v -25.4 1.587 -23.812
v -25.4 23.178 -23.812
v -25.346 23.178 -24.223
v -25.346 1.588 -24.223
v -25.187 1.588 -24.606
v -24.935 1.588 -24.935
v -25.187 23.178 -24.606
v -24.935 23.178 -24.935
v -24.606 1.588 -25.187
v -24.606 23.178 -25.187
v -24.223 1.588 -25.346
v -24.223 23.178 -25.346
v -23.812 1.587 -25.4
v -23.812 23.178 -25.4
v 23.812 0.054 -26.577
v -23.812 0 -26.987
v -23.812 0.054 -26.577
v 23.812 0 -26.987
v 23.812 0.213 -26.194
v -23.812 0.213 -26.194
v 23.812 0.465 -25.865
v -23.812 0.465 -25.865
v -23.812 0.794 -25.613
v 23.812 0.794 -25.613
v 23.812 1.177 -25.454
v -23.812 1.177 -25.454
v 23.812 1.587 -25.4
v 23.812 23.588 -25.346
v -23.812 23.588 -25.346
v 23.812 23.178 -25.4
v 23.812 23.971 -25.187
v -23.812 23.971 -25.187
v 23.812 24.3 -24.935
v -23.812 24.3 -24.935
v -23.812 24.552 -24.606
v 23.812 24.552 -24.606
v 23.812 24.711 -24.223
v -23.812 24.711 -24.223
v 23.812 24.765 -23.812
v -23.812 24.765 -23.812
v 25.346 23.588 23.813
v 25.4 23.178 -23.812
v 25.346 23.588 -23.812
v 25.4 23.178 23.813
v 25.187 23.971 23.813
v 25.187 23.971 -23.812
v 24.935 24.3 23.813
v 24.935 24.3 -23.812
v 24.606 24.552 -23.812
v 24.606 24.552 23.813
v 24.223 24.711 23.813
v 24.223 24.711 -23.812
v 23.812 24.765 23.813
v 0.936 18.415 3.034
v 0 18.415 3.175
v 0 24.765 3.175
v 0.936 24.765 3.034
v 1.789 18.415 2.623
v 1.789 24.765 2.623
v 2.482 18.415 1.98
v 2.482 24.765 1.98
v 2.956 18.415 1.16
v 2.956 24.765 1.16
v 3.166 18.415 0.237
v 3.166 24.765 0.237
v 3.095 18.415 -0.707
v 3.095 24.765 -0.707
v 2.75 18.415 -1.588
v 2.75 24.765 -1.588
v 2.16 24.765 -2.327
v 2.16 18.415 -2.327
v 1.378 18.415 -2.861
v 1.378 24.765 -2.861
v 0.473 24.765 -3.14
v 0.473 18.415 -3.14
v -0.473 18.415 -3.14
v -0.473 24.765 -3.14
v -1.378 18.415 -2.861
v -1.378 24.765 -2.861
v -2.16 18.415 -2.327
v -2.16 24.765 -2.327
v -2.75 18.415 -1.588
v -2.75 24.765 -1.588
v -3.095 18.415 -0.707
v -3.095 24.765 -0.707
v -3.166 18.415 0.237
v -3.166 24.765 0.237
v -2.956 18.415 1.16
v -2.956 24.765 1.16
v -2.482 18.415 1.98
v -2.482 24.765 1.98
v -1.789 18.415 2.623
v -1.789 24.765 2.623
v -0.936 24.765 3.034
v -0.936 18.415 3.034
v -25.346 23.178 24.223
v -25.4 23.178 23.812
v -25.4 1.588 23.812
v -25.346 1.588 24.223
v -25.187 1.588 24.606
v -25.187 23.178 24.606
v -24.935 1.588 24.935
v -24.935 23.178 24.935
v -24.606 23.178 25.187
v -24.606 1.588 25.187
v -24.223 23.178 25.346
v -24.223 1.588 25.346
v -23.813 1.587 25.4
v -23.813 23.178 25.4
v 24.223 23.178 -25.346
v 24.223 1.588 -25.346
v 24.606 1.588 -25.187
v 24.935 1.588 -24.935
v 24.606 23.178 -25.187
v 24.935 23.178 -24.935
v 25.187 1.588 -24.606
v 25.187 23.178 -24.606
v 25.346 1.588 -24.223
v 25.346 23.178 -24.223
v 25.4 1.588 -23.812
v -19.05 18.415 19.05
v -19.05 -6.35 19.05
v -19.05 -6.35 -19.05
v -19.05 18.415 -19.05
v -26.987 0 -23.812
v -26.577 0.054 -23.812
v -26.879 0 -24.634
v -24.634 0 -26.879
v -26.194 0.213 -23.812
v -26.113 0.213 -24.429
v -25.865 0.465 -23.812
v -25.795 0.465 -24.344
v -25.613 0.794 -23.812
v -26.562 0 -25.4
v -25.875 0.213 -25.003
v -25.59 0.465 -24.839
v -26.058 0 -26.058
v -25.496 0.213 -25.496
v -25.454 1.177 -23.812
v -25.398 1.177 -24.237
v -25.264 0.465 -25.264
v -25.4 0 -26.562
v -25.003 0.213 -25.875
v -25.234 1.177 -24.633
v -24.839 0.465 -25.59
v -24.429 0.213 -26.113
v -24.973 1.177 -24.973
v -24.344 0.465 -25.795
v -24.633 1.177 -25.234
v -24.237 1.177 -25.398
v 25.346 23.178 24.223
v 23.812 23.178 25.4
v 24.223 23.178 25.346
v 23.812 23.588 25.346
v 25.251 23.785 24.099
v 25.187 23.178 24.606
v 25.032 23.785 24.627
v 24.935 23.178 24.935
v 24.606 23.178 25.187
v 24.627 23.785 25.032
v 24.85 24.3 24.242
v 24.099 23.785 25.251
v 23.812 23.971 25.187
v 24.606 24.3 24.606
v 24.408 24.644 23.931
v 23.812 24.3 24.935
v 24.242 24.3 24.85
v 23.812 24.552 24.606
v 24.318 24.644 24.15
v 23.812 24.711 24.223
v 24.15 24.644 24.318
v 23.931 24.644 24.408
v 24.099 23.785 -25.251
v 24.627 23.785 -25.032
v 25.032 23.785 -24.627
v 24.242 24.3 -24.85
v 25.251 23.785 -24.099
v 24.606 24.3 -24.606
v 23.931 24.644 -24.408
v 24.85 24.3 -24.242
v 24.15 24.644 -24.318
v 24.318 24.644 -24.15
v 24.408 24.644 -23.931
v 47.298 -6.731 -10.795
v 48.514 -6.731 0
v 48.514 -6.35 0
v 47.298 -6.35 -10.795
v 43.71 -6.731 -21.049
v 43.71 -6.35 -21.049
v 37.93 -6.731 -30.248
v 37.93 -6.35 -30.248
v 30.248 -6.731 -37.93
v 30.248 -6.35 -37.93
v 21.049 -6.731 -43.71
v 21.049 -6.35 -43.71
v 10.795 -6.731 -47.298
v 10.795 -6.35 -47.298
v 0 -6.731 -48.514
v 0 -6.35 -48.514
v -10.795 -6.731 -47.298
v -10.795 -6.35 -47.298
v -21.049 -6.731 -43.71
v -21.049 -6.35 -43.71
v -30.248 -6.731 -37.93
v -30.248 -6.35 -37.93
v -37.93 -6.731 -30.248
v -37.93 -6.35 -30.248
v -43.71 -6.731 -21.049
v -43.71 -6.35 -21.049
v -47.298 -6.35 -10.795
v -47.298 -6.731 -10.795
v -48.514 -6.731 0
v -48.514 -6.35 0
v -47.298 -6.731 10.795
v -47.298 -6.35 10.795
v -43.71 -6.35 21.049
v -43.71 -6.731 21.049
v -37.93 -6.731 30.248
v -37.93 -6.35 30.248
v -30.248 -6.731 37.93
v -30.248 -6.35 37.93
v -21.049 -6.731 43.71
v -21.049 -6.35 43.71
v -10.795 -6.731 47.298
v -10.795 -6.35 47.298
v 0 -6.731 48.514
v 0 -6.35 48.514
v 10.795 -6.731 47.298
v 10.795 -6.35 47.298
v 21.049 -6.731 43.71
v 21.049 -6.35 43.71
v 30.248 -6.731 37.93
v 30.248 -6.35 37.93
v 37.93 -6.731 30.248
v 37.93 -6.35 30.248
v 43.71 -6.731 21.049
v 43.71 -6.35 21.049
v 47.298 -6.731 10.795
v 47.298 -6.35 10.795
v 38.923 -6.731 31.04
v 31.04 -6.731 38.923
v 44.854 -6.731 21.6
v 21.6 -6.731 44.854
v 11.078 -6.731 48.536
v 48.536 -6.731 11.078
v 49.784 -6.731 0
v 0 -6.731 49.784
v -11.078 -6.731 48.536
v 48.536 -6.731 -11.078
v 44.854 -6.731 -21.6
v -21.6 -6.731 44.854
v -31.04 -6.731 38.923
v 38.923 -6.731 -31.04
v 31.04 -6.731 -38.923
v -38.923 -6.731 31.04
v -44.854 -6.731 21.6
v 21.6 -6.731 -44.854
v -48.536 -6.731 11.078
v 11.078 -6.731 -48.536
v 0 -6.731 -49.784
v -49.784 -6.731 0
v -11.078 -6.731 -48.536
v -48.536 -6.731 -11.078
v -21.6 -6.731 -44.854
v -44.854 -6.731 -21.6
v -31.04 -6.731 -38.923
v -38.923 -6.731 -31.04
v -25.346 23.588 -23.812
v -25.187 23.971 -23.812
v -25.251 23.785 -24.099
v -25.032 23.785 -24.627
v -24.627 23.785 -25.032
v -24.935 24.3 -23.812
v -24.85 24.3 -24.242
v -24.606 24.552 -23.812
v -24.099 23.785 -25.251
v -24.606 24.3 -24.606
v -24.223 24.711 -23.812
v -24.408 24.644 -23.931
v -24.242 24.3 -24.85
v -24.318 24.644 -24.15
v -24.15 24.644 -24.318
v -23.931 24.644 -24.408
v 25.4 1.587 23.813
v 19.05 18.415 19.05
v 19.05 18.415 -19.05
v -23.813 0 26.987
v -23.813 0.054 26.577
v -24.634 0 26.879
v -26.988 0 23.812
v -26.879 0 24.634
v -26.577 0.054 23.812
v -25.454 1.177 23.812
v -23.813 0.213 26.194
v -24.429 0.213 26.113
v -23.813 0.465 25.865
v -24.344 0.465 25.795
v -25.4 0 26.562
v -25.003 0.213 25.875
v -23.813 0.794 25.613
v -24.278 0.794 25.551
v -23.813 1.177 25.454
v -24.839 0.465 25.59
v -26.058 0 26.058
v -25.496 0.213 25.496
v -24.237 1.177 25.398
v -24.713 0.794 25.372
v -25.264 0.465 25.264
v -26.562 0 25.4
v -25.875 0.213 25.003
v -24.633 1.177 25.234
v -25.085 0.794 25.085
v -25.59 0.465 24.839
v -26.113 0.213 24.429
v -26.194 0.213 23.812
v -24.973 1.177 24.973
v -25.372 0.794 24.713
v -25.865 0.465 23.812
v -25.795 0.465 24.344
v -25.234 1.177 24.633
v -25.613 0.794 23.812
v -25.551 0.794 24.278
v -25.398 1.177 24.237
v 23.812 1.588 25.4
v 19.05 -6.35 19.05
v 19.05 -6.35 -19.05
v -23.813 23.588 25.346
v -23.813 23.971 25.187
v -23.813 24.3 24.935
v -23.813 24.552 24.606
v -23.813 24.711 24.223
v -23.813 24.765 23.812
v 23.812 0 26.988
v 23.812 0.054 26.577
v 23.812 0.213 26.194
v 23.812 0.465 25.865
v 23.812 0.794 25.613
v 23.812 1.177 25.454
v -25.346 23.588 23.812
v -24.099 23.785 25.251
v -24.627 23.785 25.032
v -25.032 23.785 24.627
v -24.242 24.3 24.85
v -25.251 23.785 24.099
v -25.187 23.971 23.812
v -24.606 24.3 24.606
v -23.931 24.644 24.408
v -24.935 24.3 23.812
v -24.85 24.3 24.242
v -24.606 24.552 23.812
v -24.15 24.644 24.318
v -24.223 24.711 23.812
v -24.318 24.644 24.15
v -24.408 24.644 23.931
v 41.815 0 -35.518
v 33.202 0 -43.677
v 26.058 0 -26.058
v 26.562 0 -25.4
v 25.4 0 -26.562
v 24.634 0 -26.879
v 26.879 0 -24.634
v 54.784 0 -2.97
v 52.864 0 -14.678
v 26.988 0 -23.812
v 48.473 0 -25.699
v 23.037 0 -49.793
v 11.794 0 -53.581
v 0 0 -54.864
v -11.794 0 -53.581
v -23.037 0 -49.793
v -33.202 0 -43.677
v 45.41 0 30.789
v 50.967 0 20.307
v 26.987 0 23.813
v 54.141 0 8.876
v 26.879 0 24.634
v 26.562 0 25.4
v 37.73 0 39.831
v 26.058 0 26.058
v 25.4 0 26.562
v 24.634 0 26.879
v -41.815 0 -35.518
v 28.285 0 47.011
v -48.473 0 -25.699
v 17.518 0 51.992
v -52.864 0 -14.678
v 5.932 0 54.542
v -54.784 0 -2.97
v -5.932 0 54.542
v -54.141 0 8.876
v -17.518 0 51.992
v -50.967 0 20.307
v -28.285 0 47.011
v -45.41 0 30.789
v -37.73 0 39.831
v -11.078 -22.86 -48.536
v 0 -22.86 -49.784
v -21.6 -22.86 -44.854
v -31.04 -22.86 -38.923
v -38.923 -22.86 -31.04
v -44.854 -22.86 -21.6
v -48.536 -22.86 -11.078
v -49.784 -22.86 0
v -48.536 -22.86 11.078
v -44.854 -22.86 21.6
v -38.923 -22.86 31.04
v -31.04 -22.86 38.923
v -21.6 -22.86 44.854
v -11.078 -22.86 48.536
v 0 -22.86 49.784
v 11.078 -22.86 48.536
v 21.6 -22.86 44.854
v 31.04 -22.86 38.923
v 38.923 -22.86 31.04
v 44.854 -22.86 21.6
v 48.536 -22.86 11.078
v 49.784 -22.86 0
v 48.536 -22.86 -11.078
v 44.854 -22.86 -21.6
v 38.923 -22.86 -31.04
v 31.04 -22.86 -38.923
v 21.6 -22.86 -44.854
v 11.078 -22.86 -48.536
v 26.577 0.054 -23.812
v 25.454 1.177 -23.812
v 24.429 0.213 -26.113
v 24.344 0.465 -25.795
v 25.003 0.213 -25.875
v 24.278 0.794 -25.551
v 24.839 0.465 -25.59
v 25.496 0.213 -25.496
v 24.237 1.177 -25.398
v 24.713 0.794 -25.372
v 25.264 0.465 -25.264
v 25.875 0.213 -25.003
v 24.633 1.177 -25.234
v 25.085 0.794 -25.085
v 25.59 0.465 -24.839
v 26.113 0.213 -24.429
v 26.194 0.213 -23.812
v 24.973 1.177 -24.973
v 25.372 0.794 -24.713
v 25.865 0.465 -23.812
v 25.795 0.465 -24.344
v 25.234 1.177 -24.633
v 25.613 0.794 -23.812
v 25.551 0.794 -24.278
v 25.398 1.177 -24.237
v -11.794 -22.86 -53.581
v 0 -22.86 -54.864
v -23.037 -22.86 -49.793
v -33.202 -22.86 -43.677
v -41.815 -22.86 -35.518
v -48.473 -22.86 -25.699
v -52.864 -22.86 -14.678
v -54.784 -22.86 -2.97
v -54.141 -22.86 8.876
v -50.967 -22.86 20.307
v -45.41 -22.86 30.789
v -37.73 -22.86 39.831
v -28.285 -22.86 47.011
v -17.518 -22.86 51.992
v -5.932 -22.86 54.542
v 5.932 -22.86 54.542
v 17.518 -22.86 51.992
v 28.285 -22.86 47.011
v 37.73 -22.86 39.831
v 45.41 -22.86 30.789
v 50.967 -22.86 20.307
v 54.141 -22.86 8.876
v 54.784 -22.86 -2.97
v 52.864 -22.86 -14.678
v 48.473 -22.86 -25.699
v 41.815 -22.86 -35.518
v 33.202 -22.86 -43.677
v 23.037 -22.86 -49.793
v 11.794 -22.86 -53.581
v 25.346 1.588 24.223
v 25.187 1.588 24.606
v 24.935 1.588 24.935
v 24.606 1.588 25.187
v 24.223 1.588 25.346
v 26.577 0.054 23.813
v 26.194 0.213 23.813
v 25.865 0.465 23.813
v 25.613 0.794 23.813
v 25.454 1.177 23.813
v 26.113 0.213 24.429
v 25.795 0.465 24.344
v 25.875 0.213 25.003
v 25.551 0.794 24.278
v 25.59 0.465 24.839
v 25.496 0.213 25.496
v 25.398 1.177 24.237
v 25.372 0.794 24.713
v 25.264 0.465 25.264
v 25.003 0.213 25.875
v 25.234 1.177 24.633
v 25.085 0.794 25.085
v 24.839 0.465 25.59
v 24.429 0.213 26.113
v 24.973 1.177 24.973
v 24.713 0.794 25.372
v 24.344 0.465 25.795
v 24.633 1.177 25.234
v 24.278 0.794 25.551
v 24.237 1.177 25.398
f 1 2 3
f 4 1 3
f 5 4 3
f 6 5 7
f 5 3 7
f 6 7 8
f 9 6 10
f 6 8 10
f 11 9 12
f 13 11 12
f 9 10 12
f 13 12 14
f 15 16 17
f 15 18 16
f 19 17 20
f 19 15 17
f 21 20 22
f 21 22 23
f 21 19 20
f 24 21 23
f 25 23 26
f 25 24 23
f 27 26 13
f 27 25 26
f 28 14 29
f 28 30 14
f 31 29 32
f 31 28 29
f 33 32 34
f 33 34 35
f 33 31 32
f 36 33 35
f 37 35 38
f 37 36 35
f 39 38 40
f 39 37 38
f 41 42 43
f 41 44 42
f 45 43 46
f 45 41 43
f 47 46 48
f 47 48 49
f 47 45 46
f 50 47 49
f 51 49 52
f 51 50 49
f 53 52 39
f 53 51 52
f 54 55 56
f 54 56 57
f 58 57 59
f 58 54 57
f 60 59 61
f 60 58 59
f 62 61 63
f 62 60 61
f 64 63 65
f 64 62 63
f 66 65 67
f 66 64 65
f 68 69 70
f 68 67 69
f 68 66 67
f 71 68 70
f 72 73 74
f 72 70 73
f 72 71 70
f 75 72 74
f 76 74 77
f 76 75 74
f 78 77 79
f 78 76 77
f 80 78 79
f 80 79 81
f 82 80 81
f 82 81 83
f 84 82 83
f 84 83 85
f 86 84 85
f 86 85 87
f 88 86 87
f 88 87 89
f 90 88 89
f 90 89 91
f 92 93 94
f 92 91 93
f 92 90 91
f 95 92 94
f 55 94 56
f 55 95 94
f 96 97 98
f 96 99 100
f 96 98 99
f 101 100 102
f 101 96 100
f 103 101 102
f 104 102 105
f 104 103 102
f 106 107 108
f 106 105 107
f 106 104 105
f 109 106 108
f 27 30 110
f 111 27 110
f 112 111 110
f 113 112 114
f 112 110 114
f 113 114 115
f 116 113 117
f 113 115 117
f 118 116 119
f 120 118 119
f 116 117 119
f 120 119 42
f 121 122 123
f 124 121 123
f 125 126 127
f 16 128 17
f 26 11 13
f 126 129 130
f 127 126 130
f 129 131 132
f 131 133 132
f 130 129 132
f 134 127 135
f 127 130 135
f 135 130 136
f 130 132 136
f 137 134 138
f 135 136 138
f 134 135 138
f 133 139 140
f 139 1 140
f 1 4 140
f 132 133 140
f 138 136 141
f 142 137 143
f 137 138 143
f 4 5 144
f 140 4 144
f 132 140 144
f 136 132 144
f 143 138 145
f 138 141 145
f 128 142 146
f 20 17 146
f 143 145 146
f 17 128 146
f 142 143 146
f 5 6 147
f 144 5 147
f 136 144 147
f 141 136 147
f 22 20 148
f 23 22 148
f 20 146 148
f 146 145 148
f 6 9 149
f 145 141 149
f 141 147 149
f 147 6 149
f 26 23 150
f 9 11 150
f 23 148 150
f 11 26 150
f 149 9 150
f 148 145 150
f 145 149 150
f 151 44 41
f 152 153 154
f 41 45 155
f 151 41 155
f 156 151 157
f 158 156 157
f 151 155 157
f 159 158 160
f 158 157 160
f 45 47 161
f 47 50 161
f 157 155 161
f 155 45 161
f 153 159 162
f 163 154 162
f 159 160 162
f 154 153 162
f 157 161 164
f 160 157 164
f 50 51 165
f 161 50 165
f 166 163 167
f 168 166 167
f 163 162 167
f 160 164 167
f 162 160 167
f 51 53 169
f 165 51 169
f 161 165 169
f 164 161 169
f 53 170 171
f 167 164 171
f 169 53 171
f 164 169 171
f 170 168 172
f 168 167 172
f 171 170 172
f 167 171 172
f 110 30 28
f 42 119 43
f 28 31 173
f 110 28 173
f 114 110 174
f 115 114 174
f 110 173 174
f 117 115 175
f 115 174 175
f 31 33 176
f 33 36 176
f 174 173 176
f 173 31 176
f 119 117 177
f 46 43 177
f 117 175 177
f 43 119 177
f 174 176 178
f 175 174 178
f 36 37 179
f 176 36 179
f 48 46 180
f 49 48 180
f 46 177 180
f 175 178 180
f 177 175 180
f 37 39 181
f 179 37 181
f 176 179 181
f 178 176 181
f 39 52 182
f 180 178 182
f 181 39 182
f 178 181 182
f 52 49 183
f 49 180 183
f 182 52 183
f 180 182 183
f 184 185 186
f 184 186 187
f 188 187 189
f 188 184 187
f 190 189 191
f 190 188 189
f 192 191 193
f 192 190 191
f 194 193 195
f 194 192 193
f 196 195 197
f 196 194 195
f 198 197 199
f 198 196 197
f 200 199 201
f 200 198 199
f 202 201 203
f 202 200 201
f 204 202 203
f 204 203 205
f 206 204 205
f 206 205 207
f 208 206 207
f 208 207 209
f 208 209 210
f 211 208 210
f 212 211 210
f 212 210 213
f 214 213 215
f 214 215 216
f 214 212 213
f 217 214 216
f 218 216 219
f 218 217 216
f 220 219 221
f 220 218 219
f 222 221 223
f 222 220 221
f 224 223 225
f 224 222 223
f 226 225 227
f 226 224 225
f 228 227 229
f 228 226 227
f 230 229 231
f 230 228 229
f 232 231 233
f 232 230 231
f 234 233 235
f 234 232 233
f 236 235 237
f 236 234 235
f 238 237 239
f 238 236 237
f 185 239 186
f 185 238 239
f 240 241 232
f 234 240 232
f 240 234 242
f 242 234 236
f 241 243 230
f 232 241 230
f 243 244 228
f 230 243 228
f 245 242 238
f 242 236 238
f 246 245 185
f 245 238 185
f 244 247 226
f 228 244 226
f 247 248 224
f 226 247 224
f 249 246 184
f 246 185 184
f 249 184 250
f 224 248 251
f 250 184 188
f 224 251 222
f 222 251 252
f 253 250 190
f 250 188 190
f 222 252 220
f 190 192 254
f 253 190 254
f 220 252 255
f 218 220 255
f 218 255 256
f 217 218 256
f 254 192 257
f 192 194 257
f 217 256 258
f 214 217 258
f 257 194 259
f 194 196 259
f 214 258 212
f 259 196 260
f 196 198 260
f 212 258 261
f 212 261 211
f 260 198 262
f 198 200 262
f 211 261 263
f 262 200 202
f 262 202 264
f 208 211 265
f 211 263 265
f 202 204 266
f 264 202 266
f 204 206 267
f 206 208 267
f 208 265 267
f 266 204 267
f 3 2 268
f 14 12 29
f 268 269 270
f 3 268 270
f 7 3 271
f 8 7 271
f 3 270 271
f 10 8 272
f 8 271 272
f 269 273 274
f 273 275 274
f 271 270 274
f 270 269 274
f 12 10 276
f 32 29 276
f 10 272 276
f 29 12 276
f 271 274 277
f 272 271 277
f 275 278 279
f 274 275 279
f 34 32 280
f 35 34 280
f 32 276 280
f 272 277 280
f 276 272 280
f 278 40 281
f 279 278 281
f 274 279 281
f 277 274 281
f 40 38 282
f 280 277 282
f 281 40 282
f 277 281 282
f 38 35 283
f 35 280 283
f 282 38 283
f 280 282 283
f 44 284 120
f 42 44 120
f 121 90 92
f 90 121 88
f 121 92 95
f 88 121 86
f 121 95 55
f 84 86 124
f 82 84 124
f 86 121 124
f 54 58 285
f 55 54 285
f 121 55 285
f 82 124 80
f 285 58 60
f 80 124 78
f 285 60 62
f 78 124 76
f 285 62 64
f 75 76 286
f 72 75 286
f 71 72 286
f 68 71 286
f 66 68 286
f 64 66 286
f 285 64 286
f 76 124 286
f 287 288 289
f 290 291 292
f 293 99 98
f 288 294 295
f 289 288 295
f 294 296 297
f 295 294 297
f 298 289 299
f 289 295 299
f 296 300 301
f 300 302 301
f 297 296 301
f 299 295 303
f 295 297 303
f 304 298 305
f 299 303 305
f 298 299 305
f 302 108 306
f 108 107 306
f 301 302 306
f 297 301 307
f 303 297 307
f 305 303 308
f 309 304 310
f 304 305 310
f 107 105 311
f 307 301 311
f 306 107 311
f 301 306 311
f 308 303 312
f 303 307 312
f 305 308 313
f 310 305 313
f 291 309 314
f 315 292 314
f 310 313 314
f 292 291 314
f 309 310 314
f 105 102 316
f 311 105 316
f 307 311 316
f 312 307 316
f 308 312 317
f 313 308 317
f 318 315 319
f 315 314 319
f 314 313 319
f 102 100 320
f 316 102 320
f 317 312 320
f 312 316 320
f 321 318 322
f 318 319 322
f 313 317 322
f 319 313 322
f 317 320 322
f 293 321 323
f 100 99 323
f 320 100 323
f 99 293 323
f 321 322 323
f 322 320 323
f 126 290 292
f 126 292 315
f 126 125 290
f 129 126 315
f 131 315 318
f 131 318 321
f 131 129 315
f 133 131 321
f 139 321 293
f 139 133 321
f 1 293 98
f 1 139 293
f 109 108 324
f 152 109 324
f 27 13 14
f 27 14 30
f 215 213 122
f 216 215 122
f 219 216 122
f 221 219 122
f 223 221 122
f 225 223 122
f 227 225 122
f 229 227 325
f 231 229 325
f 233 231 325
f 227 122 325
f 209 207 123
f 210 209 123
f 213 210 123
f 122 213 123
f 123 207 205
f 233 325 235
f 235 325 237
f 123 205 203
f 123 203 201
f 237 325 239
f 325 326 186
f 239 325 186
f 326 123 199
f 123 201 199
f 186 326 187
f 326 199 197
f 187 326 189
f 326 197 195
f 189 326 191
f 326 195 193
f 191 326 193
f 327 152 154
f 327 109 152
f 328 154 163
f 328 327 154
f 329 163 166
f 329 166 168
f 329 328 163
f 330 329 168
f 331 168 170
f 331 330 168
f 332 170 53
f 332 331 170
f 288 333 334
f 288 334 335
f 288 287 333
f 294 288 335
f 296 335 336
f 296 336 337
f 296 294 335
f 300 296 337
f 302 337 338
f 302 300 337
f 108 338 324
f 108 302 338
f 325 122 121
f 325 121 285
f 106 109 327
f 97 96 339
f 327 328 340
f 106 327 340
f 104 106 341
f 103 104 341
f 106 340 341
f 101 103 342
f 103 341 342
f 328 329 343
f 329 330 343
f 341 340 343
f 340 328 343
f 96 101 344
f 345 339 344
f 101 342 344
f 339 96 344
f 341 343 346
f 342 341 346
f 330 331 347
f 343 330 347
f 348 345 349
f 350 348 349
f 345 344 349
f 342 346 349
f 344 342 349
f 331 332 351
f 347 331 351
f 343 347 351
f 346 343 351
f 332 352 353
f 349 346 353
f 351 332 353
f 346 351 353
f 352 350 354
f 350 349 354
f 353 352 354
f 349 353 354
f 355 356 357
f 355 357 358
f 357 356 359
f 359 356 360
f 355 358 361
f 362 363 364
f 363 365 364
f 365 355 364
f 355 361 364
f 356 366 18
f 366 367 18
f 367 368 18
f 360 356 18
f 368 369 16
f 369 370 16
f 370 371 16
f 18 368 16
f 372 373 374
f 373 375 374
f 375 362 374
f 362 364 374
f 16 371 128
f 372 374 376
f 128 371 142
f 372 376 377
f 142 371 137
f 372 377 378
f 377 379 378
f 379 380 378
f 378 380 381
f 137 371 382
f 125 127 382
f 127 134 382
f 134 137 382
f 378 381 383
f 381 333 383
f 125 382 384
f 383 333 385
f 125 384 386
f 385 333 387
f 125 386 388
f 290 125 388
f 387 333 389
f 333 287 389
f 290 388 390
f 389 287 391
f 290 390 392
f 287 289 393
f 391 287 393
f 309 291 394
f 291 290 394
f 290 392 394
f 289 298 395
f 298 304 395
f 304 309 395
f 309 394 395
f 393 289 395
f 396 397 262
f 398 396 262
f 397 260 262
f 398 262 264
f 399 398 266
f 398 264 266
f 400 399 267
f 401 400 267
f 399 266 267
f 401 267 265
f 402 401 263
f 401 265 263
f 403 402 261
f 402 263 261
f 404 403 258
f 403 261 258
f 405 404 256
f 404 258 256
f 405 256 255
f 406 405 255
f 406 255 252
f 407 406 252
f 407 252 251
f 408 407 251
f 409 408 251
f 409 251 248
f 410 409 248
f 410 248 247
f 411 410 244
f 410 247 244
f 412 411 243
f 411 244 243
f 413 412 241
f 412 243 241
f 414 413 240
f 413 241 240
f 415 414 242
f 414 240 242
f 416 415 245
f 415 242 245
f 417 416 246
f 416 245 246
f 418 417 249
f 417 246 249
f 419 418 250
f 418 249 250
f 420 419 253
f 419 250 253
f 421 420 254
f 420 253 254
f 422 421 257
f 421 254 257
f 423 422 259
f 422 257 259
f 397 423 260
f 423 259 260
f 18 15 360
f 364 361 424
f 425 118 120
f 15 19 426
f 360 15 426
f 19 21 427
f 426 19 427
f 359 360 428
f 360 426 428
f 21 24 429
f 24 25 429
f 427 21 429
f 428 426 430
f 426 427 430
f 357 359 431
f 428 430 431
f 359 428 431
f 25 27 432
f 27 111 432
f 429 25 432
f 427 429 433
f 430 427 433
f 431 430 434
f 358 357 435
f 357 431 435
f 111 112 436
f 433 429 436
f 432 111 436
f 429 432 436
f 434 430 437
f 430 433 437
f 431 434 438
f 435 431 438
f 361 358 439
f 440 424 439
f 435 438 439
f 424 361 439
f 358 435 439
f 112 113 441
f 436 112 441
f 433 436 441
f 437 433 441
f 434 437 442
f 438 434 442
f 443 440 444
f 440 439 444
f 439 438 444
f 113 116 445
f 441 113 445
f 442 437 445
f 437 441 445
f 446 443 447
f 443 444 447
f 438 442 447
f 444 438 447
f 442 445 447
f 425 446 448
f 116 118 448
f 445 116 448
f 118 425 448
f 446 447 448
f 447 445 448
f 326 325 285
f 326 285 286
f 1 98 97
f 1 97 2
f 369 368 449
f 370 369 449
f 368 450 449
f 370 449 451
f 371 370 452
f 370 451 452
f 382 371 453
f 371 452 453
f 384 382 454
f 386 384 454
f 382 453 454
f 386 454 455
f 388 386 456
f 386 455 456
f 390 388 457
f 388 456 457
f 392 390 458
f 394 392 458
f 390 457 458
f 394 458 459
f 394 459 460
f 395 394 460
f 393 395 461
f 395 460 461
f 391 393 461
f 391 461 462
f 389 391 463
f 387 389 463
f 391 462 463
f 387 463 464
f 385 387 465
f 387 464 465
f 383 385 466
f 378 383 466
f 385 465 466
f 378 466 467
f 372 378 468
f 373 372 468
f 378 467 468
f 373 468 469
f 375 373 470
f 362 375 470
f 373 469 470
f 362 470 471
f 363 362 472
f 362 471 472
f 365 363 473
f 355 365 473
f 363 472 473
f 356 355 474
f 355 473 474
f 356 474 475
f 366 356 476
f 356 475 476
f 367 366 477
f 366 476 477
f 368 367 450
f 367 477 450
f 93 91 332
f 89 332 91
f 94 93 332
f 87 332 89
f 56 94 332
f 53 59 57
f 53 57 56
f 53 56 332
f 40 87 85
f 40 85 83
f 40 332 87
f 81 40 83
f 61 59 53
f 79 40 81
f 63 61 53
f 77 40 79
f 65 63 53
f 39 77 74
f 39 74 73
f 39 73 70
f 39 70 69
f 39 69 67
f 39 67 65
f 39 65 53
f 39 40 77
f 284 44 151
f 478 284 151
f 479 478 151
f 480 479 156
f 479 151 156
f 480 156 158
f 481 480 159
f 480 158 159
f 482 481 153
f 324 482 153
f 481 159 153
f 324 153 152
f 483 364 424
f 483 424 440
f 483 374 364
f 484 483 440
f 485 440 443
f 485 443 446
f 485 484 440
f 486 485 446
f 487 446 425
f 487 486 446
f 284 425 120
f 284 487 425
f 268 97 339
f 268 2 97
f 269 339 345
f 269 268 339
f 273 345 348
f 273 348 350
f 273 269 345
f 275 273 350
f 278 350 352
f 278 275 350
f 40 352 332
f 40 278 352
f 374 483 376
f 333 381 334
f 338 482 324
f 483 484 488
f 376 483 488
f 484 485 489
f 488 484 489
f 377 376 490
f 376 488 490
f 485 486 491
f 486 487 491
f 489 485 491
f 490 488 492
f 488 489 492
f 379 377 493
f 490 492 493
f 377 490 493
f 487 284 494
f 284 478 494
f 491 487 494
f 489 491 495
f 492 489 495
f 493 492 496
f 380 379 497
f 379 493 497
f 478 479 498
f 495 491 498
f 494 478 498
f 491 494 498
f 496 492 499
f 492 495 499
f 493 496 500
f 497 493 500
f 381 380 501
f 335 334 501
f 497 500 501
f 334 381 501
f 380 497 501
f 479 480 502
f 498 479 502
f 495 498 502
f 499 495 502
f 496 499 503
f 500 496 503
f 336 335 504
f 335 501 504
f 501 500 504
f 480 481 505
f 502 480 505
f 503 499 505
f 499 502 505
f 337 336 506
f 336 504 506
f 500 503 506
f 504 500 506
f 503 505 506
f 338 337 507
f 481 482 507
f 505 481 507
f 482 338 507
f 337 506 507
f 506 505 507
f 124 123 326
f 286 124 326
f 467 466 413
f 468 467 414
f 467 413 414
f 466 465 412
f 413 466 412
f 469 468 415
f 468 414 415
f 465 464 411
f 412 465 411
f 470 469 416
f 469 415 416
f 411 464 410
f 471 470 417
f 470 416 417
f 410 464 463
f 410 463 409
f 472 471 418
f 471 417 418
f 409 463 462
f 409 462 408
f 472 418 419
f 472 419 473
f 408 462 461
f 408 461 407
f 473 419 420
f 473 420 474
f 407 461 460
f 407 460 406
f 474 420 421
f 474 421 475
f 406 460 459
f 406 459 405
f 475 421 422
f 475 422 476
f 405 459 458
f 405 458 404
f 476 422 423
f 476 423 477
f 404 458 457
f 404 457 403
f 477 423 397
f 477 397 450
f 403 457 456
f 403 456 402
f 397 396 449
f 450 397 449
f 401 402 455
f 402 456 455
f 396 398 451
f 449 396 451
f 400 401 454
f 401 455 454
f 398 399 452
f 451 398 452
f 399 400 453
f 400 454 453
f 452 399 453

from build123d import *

# Parameters (mm, degrees)
SKETCH2_W               = 50.8
SKETCH2_H               = 50.8
BOSS_EXTRUDE1_DEPTH     = 24.765
SHELL1_START            = -6.731
SHELL1_OUTLINE_W        = 38.1
SHELL1_OUTLINE_H        = 38.1
SHELL1_DEPTH            = 25.146
SHELL1_2_OUTLINE_R      = 48.514
SHELL1_2_OUTLINE_W      = 38.1
SHELL1_2_OUTLINE_H      = 38.1
SHELL1_2_DEPTH          = 0.381
FILLET1_R               = 1.5875
FILLET2_R               = 1.5875
CUT_EXTRUDE1_DEPTH      = 82.445823816
CUT_EXTRUDE1_DEPTH_BACK = 82.445823816
SKETCH3_R               = 3.175


# Read off the part's stored shape, not the designer's step: Shell1
with BuildPart() as part:
    # Sketch1 → Revolve1 (revolve)
    with BuildSketch(Plane.XY, mode=Mode.PRIVATE) as revolve1_sk:
        Polygon((0, 0), (54.864, 0), (54.864, -22.86), (49.784, -22.86), (49.784, -6.731), (0, -6.731), align=None)
    revolve(revolve1_sk.sketch.rotate(Axis((0, -987.311672366, 0), (0, 1, 0)), 90), axis=Axis((0, -987.311672366, 0), (0, 1, 0)))

    # Sketch2 → Boss-Extrude1 (add)
    with BuildSketch(Plane(origin=(0, 0, 0), x_dir=(1, 0, 0), z_dir=(0, 1, 0))):
        Rectangle(SKETCH2_W, SKETCH2_H)
    extrude(amount=BOSS_EXTRUDE1_DEPTH)

    # Shell1 outline → Shell1 (cut)
    with BuildSketch(Plane(origin=(0, 0, 0), x_dir=(1, 0, 0), z_dir=(0, 1, 0)).offset(SHELL1_START)):
        Rectangle(SHELL1_OUTLINE_W, SHELL1_OUTLINE_H)
    extrude(amount=SHELL1_DEPTH, mode=Mode.SUBTRACT)

    # Shell1 2 outline → Shell1 2 (cut)
    with BuildSketch(Plane(origin=(0, 0, 0), x_dir=(1, 0, 0), z_dir=(0, 1, 0)).offset(SHELL1_START)):
        Circle(SHELL1_2_OUTLINE_R)
        Rectangle(SHELL1_2_OUTLINE_W, SHELL1_2_OUTLINE_H, mode=Mode.SUBTRACT)
    extrude(amount=SHELL1_2_DEPTH, mode=Mode.SUBTRACT)

    # Fillet1
    fillet1_edges = [part.edges().sort_by_distance(p)[0] for p in [
        (-25.4, 12.3825, -25.4),
        (-25.4, 12.3825, 25.4),
        (25.4, 12.3825, 25.4),
        (25.4, 12.3825, -25.4),
    ]]
    fillet(fillet1_edges, radius=FILLET1_R)

    # Fillet2
    fillet2_edges = [part.edges().sort_by_distance(p)[0] for p in [
        (0, 0, -25.4),
        (0, 24.765, -25.4),
        (25.4, 0, 0),
        (25.4, 24.765, 0),
        (-25.4, 24.765, 0),
        (0, 24.765, 25.4),
        (-24.935032015, 24.765, -24.935032015),
        (-24.935032015, 24.765, 24.935032015),
        (24.935032015, 24.765, 24.935032015),
        (24.935032015, 24.765, -24.935032015),
        (0, 0, 25.4),
        (-25.4, 0, 0),
        (24.935032015, 0, -24.935032015),
        (24.935032015, 0, 24.935032015),
        (-24.935032015, 0, 24.935032015),
        (-24.935032015, 0, -24.935032015),
    ]]
    fillet(fillet2_edges, radius=FILLET2_R)

    # Sketch3 → Cut-Extrude1 (cut, two sides: drawn at the far end of the back side and taken through both)
    with BuildSketch(Plane(origin=(0, 0, 0), x_dir=(1, 0, 0), z_dir=(0, 1, 0)).offset(-CUT_EXTRUDE1_DEPTH_BACK)):
        with Locations(Location((0, 0, 0), (0, 0, 270))):
            Circle(SKETCH3_R)
    extrude(amount=CUT_EXTRUDE1_DEPTH + CUT_EXTRUDE1_DEPTH_BACK, mode=Mode.SUBTRACT)


solid = part.part
